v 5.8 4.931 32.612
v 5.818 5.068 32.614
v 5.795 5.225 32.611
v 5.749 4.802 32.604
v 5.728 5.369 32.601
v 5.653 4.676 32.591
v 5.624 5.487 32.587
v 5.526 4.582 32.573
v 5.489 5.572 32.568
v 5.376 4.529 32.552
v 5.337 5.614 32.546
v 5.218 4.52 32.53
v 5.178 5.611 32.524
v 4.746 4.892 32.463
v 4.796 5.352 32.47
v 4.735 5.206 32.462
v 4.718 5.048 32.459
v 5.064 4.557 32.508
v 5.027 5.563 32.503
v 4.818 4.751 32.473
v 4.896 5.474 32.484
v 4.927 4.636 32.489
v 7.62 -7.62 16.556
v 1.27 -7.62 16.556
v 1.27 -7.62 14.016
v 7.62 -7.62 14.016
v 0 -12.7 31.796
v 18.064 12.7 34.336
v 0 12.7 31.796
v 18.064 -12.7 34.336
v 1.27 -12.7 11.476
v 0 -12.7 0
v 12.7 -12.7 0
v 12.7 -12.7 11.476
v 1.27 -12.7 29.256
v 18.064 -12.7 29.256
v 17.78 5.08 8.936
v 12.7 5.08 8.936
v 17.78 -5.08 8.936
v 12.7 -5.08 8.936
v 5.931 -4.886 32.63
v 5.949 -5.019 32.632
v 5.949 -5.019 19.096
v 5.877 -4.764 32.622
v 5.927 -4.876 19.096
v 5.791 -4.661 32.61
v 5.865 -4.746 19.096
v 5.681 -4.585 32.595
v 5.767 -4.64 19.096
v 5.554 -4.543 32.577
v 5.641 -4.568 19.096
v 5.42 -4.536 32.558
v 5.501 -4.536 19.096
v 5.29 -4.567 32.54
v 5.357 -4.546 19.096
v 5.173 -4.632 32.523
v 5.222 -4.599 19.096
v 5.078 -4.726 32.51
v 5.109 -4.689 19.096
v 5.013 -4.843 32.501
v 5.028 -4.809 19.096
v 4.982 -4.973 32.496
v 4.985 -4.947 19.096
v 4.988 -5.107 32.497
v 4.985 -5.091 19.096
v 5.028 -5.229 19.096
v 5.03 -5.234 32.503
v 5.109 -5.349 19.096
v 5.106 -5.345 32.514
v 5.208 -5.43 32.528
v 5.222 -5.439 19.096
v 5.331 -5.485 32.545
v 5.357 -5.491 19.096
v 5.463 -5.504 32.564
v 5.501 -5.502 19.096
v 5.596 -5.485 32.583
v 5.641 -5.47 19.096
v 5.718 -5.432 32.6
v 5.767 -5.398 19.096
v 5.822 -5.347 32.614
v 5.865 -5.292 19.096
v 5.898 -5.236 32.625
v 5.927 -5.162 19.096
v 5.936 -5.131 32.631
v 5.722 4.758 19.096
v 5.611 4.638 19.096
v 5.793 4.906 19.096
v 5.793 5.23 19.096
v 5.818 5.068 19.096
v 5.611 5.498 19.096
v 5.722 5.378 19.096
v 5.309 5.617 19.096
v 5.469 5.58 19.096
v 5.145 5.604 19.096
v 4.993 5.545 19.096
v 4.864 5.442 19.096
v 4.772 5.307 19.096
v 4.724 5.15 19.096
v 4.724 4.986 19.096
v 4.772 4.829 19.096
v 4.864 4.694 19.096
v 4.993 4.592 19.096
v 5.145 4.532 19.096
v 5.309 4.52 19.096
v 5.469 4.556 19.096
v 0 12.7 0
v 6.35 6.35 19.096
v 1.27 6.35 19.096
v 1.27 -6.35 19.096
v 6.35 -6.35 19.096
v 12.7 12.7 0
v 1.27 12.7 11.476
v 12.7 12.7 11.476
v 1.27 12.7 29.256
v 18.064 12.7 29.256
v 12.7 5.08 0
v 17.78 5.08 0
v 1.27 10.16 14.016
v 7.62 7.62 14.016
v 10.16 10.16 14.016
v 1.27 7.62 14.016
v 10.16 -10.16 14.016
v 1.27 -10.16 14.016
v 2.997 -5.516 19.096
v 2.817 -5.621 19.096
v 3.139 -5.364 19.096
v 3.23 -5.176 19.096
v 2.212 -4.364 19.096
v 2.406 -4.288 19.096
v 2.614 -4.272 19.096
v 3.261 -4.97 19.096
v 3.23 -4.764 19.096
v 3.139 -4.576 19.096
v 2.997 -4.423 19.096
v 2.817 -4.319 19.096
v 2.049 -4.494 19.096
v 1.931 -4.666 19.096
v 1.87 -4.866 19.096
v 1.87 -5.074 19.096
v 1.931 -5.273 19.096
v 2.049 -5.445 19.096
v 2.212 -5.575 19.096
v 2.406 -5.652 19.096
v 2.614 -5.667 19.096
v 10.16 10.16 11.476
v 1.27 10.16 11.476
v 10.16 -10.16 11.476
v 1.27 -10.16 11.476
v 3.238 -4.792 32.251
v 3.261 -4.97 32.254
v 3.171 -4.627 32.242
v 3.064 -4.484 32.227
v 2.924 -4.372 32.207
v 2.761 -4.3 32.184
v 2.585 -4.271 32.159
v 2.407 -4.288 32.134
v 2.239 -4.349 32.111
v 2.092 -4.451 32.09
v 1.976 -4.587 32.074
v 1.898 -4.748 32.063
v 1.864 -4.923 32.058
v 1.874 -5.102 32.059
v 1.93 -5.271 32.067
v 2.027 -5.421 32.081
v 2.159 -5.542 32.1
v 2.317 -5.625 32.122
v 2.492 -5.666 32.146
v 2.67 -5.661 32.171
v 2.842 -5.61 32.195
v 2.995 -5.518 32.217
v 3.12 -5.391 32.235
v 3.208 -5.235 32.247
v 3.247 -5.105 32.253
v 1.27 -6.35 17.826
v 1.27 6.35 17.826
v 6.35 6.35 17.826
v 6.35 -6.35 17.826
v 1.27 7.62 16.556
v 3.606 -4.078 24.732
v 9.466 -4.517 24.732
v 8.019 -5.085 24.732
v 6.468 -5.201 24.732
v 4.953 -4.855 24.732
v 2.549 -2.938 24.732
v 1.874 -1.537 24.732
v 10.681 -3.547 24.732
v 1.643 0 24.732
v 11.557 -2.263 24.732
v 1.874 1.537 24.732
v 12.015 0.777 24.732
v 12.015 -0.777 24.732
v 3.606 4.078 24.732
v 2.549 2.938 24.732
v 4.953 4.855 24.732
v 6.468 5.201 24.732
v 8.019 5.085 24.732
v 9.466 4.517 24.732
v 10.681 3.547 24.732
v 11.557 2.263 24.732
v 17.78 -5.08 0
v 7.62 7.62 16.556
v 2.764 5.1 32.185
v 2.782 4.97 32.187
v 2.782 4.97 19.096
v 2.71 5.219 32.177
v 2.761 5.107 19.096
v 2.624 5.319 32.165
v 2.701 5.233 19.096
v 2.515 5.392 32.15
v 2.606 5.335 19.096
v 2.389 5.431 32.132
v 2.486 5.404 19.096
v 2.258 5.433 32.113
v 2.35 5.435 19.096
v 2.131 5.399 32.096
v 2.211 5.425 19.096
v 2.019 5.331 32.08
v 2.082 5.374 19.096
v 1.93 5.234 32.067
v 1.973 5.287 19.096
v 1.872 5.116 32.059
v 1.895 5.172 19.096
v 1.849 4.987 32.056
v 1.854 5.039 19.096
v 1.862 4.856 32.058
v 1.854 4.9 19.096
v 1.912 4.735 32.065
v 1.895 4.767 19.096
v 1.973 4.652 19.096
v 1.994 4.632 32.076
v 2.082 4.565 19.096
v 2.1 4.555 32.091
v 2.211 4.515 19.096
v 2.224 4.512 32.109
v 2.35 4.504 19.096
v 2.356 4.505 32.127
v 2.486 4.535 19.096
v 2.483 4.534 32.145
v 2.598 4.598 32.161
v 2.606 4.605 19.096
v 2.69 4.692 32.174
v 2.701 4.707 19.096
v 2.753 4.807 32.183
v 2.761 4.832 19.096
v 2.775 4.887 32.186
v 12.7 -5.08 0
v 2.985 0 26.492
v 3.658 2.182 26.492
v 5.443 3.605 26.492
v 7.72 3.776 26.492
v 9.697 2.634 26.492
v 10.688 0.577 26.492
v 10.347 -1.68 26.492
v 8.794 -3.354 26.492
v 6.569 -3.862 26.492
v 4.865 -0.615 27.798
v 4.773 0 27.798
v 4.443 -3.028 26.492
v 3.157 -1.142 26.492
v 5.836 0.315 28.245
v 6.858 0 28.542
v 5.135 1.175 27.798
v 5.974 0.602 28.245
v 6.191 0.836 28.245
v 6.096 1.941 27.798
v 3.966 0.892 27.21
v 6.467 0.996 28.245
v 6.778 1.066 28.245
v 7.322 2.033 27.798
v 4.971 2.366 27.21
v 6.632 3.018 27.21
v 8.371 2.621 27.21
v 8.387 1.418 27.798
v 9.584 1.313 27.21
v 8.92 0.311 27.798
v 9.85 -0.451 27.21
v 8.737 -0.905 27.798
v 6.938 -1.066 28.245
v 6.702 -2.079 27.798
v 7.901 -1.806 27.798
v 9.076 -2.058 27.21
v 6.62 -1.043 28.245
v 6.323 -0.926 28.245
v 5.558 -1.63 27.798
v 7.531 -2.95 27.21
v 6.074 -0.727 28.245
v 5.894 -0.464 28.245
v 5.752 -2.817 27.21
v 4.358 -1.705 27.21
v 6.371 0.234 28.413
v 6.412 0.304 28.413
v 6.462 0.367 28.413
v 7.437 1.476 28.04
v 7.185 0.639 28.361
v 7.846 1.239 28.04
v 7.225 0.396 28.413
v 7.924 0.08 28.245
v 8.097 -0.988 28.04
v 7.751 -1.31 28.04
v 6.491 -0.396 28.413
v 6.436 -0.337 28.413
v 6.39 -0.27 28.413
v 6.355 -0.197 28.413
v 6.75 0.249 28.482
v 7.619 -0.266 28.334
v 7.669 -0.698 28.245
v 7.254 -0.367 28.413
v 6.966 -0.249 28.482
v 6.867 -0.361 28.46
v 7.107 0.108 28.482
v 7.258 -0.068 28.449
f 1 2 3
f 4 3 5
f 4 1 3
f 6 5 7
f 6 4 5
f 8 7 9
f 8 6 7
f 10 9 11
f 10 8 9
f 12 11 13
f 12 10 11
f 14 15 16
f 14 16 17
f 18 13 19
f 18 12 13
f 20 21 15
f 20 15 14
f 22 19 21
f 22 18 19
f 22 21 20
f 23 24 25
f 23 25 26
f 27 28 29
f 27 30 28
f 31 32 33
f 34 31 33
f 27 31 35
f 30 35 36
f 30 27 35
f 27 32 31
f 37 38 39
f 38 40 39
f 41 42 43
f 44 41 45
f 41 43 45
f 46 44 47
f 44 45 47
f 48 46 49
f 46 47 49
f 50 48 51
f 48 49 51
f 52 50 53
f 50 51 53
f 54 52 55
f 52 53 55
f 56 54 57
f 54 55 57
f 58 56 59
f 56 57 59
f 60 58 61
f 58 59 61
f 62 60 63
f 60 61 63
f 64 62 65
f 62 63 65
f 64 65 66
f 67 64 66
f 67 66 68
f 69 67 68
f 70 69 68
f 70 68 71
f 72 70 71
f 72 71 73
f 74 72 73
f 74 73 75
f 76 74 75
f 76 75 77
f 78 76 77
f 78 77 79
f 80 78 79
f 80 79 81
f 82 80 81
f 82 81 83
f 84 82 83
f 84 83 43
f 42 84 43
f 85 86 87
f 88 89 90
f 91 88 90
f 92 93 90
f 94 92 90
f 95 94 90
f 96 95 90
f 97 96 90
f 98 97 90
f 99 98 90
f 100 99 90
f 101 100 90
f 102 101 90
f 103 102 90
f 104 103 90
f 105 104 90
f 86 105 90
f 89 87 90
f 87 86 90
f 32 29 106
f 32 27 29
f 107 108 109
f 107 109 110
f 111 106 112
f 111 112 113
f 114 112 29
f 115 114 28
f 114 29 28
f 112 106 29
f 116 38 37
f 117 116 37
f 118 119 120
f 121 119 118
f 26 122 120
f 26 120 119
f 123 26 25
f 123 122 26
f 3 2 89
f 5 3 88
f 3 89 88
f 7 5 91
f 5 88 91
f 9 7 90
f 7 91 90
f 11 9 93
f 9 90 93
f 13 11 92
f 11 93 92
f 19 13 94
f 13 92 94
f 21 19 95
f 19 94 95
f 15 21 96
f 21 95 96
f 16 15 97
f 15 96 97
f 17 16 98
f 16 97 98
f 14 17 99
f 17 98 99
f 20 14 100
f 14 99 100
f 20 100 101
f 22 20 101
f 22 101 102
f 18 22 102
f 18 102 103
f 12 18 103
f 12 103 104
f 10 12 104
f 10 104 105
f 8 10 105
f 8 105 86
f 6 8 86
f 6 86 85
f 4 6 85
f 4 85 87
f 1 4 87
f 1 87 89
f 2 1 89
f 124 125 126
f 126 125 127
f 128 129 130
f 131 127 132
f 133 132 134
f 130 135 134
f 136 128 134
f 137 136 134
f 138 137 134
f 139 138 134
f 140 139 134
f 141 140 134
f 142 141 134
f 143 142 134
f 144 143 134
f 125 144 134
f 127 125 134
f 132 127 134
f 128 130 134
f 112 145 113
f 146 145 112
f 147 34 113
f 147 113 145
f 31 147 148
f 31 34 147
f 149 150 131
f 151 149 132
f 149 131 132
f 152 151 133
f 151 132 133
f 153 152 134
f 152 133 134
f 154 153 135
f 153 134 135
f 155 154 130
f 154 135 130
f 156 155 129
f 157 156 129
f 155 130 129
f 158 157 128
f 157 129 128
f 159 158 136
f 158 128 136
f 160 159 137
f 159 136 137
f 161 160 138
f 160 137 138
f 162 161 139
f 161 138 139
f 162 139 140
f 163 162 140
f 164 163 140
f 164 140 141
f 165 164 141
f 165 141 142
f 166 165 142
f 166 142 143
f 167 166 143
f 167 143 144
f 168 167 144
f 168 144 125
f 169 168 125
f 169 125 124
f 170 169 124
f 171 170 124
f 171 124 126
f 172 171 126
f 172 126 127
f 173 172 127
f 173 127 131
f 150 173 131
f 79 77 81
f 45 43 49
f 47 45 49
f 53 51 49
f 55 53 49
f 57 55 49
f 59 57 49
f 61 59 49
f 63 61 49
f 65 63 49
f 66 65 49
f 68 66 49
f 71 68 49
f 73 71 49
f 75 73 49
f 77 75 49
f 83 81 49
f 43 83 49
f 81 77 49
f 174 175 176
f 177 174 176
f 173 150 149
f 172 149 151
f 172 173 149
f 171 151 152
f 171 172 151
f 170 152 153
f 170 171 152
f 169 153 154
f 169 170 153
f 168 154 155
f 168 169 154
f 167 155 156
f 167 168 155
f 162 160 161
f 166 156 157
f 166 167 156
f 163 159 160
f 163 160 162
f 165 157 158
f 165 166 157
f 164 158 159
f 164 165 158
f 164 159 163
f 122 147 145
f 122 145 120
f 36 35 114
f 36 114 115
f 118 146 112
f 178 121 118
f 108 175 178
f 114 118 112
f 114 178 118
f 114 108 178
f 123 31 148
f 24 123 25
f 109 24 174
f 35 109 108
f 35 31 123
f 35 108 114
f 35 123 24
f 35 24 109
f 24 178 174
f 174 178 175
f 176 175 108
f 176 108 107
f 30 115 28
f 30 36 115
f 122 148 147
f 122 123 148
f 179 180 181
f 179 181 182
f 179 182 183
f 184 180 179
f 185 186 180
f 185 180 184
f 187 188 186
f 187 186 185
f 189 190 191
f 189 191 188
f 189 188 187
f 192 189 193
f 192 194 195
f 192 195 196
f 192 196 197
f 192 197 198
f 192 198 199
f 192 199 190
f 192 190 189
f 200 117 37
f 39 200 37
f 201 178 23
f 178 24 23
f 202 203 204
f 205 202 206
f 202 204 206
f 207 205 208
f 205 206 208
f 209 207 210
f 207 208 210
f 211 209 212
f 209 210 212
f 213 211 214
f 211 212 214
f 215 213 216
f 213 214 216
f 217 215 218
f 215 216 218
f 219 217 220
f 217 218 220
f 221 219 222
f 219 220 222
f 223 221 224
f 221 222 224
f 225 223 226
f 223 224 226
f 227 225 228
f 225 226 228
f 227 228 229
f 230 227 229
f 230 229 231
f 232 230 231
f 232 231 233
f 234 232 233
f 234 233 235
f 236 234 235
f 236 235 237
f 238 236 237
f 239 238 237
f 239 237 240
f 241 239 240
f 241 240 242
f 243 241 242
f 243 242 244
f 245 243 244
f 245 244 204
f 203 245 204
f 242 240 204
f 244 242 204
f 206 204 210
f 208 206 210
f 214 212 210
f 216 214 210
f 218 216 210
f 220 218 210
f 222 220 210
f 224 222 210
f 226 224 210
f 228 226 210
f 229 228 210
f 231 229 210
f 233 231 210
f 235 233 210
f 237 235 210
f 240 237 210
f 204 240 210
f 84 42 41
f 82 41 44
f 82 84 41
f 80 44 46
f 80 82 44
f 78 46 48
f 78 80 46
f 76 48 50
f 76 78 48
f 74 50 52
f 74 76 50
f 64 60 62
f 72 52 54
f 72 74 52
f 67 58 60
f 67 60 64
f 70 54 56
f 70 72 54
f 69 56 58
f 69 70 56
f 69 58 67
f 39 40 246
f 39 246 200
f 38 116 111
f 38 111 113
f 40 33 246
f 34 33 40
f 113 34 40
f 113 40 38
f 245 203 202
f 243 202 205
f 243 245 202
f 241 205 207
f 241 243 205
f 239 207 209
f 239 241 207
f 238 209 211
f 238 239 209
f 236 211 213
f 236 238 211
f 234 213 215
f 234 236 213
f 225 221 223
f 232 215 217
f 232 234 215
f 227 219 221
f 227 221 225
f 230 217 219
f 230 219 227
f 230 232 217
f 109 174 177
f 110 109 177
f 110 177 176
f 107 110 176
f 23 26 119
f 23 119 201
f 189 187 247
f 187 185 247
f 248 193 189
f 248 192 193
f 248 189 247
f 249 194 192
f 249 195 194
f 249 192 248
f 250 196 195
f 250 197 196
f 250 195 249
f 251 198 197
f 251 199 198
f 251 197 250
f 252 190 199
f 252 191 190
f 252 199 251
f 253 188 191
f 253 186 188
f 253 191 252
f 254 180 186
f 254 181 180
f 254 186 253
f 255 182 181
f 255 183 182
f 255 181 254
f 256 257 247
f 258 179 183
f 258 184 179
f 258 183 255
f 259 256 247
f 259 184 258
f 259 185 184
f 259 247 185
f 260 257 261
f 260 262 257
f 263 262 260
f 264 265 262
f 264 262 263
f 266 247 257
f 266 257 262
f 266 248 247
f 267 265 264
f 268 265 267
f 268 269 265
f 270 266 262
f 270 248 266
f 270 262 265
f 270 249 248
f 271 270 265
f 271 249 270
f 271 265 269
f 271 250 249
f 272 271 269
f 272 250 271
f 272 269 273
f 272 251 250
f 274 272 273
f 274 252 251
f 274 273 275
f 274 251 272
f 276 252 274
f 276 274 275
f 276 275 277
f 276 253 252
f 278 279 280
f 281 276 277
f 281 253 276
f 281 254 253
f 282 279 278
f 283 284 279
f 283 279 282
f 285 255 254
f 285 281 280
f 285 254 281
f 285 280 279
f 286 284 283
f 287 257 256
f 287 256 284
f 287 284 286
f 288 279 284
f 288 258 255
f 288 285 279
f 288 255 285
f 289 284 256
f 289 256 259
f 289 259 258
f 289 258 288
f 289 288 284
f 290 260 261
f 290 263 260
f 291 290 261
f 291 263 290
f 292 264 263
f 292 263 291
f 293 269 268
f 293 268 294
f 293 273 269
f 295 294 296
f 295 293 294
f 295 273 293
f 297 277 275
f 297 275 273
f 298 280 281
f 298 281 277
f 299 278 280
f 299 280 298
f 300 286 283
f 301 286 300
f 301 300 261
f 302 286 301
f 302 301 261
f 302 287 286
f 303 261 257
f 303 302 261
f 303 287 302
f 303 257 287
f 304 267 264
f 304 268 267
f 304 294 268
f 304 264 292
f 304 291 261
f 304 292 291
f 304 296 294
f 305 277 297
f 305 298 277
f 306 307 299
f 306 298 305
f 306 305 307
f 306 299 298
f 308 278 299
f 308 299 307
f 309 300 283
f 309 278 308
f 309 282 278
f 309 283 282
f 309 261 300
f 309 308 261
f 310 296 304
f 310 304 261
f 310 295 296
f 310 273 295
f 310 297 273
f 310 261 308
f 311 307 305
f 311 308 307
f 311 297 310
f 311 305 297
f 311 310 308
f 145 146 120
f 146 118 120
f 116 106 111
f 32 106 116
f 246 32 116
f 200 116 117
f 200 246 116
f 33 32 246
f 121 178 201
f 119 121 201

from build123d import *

# Parameters (mm, degrees)
F1_DEPTH  = 12.7
F0_W      = 5.08
F0_H      = 8.9359007079
F2_DEPTH  = 5.08
F3_DEPTH  = 10.16
F0_W_2    = 6.35
F0_H_2    = 2.54
F4_DEPTH  = 7.62
F8_W      = 5.08
F8_H      = 12.7
F9_DEPTH  = 1.27
F10_R     = 0.6993385281
F11_REACH = 17.2190280622
F10_R_2   = 0.4846158618
F10_R_3   = 0.4668021957
F10_R_4   = 0.550131889


with BuildPart() as f1:
    # F0 (on Front) → F1 (new body, symmetric)
    with BuildSketch(Plane.XZ):
        Polygon((0, 31.7959007079), (0, 0), (12.7, 0), (12.7, 8.9359007079), (12.7, 11.4759007079), (10.16, 11.4759007079), (1.27, 11.4759007079), (1.27, 14.0159007079), (1.27, 16.5559007079), (1.27, 29.2559007079), (18.063576892, 29.2559007079), (18.063576892, 34.3359007079), align=None)
    extrude(amount=F1_DEPTH, both=True)

    # F0 (on Front) → F2 (join, symmetric)
    with BuildSketch(Plane.XZ):
        with Locations((15.24, 4.467950354)):
            Rectangle(F0_W, F0_H)
    extrude(amount=F2_DEPTH, both=True)

    # F0 (on Front) → F3 (join, symmetric)
    with BuildSketch(Plane.XZ):
        Polygon((1.27, 11.4759007079), (10.16, 11.4759007079), (10.16, 14.0159007079), (7.62, 14.0159007079), (1.27, 14.0159007079), align=None)
    extrude(amount=F3_DEPTH, both=True)

    # F0 (on Front) → F4 (join, symmetric)
    with BuildSketch(Plane.XZ):
        with Locations((4.445, 15.2859007079)):
            Rectangle(F0_W_2, F0_H_2)
    extrude(amount=F4_DEPTH, both=True)

    # F8 (on offset) → F9 (join)
    with BuildSketch(Plane.XY.offset(17.8259007079)):
        with Locations((3.81, 0)):
            Rectangle(F8_W, F8_H)
    extrude(amount=F9_DEPTH)


with BuildPart() as f6:
    # F5 (on Front) → F6 (revolve)
    with BuildSketch(Plane.XZ):
        with BuildLine():
            ThreePointArc((6.858, 28.5420352743), (3.8318670551, 27.2097778537), (1.6425333333, 24.7320352743))
            Line((1.6425333333, 24.7320352743), (6.858, 24.7320352743))
            Line((6.858, 24.7320352743), (6.858, 28.5420352743))
        make_face()
    revolve(axis=Axis((6.858, 0, 28.8225058466), (0, 0, -1)))


with BuildPart() as f11:
    f11_end = f1.part.faces().sort_by_distance((9.031788446, 0, 33.0659007079))[0]
    # F10 (on face) → F11 (new body, up to a face of F1 that its end follows)
    with BuildSketch(Plane.XY.offset(19.0959007079)):
        with Locations((2.5612919126, -4.9697342329)):
            Circle(F10_R)
    f11_long = extrude(amount=F11_REACH, mode=Mode.PRIVATE)
    add(split(f11_long, bisect_by=f11_end, keep=Keep.BOTTOM, mode=Mode.PRIVATE))


with BuildPart() as f11b:
    f11_2_end = f1.part.faces().sort_by_distance((9.031788446, 0, 33.0659007079))[0]
    # F10 (on face) → F11, piece 2 (new body, up to a face of F1 that its end follows)
    with BuildSketch(Plane.XY.offset(19.0959007079)):
        with Locations((5.4644043557, -5.0189397298)):
            Circle(F10_R_2)
    f11_2_long = extrude(amount=F11_REACH, mode=Mode.PRIVATE)
    add(split(f11_2_long, bisect_by=f11_2_end, keep=Keep.BOTTOM, mode=Mode.PRIVATE))


with BuildPart() as f11c:
    f11_3_end = f1.part.faces().sort_by_distance((9.031788446, 0, 33.0659007079))[0]
    # F10 (on face) → F11, piece 3 (new body, up to a face of F1 that its end follows)
    with BuildSketch(Plane.XY.offset(19.0959007079)):
        with Locations((2.3152653594, 4.9697356299)):
            Circle(F10_R_3)
    f11_3_long = extrude(amount=F11_REACH, mode=Mode.PRIVATE)
    add(split(f11_3_long, bisect_by=f11_3_end, keep=Keep.BOTTOM, mode=Mode.PRIVATE))


with BuildPart() as f11d:
    f11_4_end = f1.part.faces().sort_by_distance((9.031788446, 0, 33.0659007079))[0]
    # F10 (on face) → F11, piece 4 (new body, up to a face of F1 that its end follows)
    with BuildSketch(Plane.XY.offset(19.0959007079)):
        with Locations((5.2675828338, 5.0681466237)):
            Circle(F10_R_4)
    f11_4_long = extrude(amount=F11_REACH, mode=Mode.PRIVATE)
    add(split(f11_4_long, bisect_by=f11_4_end, keep=Keep.BOTTOM, mode=Mode.PRIVATE))


solid = Compound([f1.part, f6.part, f11.part, f11b.part, f11c.part, f11d.part])
